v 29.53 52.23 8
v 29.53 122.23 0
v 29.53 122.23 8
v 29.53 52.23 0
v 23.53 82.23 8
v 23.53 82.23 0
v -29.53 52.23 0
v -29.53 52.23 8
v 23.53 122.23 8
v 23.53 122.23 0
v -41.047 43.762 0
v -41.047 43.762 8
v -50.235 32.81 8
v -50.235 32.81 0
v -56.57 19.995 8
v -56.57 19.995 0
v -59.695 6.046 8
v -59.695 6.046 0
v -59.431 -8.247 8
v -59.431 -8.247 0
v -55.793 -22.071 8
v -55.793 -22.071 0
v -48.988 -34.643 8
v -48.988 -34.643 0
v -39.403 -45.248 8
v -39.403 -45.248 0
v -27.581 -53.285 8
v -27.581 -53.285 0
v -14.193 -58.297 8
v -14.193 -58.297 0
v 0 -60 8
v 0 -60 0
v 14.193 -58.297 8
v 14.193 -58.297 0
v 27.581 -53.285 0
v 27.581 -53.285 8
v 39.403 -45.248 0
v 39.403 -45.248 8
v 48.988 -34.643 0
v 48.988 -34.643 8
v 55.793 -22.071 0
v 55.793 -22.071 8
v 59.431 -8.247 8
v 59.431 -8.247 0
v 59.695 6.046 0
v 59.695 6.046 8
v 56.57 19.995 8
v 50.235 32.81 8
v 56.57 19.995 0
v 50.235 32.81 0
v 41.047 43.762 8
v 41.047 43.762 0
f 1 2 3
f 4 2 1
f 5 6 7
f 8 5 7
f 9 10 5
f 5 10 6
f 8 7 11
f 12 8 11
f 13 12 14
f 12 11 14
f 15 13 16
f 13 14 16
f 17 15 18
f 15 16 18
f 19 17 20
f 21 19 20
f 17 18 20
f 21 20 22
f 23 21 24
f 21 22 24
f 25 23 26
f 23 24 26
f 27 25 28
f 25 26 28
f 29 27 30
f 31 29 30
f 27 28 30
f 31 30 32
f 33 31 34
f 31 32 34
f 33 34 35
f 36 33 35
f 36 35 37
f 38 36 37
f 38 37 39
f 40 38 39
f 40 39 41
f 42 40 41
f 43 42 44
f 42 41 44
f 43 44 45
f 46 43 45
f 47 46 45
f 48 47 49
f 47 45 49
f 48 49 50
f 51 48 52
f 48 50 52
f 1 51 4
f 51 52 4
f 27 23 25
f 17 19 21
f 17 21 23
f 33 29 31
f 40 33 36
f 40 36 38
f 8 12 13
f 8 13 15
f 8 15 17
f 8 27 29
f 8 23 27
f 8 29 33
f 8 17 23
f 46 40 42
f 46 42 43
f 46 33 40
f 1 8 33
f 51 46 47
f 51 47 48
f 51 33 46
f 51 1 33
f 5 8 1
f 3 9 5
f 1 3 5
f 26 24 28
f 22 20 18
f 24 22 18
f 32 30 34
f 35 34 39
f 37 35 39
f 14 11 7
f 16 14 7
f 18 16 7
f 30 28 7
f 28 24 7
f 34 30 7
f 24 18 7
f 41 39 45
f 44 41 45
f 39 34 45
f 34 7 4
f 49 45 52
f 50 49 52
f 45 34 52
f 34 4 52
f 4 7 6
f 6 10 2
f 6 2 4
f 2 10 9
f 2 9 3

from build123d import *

# Parameters (mm, degrees)
PAD_DEPTH = 8


with BuildPart() as part:
    # Sketch → Pad (new body)
    with BuildSketch(Plane.XY):
        with BuildLine():
            ThreePointArc((-29.53026, 52.229912), (0, -60), (29.53026, 52.229912))
            Line((29.53026, 122.229912), (29.53026, 52.229912))
            Line((23.53026, 122.229912), (29.53026, 122.229912))
            Line((23.53026, 122.229912), (23.53026, 82.229912))
            Line((23.53026, 82.229912), (-29.53026, 52.229912))
        make_face()
    extrude(amount=PAD_DEPTH)


solid = part.part
